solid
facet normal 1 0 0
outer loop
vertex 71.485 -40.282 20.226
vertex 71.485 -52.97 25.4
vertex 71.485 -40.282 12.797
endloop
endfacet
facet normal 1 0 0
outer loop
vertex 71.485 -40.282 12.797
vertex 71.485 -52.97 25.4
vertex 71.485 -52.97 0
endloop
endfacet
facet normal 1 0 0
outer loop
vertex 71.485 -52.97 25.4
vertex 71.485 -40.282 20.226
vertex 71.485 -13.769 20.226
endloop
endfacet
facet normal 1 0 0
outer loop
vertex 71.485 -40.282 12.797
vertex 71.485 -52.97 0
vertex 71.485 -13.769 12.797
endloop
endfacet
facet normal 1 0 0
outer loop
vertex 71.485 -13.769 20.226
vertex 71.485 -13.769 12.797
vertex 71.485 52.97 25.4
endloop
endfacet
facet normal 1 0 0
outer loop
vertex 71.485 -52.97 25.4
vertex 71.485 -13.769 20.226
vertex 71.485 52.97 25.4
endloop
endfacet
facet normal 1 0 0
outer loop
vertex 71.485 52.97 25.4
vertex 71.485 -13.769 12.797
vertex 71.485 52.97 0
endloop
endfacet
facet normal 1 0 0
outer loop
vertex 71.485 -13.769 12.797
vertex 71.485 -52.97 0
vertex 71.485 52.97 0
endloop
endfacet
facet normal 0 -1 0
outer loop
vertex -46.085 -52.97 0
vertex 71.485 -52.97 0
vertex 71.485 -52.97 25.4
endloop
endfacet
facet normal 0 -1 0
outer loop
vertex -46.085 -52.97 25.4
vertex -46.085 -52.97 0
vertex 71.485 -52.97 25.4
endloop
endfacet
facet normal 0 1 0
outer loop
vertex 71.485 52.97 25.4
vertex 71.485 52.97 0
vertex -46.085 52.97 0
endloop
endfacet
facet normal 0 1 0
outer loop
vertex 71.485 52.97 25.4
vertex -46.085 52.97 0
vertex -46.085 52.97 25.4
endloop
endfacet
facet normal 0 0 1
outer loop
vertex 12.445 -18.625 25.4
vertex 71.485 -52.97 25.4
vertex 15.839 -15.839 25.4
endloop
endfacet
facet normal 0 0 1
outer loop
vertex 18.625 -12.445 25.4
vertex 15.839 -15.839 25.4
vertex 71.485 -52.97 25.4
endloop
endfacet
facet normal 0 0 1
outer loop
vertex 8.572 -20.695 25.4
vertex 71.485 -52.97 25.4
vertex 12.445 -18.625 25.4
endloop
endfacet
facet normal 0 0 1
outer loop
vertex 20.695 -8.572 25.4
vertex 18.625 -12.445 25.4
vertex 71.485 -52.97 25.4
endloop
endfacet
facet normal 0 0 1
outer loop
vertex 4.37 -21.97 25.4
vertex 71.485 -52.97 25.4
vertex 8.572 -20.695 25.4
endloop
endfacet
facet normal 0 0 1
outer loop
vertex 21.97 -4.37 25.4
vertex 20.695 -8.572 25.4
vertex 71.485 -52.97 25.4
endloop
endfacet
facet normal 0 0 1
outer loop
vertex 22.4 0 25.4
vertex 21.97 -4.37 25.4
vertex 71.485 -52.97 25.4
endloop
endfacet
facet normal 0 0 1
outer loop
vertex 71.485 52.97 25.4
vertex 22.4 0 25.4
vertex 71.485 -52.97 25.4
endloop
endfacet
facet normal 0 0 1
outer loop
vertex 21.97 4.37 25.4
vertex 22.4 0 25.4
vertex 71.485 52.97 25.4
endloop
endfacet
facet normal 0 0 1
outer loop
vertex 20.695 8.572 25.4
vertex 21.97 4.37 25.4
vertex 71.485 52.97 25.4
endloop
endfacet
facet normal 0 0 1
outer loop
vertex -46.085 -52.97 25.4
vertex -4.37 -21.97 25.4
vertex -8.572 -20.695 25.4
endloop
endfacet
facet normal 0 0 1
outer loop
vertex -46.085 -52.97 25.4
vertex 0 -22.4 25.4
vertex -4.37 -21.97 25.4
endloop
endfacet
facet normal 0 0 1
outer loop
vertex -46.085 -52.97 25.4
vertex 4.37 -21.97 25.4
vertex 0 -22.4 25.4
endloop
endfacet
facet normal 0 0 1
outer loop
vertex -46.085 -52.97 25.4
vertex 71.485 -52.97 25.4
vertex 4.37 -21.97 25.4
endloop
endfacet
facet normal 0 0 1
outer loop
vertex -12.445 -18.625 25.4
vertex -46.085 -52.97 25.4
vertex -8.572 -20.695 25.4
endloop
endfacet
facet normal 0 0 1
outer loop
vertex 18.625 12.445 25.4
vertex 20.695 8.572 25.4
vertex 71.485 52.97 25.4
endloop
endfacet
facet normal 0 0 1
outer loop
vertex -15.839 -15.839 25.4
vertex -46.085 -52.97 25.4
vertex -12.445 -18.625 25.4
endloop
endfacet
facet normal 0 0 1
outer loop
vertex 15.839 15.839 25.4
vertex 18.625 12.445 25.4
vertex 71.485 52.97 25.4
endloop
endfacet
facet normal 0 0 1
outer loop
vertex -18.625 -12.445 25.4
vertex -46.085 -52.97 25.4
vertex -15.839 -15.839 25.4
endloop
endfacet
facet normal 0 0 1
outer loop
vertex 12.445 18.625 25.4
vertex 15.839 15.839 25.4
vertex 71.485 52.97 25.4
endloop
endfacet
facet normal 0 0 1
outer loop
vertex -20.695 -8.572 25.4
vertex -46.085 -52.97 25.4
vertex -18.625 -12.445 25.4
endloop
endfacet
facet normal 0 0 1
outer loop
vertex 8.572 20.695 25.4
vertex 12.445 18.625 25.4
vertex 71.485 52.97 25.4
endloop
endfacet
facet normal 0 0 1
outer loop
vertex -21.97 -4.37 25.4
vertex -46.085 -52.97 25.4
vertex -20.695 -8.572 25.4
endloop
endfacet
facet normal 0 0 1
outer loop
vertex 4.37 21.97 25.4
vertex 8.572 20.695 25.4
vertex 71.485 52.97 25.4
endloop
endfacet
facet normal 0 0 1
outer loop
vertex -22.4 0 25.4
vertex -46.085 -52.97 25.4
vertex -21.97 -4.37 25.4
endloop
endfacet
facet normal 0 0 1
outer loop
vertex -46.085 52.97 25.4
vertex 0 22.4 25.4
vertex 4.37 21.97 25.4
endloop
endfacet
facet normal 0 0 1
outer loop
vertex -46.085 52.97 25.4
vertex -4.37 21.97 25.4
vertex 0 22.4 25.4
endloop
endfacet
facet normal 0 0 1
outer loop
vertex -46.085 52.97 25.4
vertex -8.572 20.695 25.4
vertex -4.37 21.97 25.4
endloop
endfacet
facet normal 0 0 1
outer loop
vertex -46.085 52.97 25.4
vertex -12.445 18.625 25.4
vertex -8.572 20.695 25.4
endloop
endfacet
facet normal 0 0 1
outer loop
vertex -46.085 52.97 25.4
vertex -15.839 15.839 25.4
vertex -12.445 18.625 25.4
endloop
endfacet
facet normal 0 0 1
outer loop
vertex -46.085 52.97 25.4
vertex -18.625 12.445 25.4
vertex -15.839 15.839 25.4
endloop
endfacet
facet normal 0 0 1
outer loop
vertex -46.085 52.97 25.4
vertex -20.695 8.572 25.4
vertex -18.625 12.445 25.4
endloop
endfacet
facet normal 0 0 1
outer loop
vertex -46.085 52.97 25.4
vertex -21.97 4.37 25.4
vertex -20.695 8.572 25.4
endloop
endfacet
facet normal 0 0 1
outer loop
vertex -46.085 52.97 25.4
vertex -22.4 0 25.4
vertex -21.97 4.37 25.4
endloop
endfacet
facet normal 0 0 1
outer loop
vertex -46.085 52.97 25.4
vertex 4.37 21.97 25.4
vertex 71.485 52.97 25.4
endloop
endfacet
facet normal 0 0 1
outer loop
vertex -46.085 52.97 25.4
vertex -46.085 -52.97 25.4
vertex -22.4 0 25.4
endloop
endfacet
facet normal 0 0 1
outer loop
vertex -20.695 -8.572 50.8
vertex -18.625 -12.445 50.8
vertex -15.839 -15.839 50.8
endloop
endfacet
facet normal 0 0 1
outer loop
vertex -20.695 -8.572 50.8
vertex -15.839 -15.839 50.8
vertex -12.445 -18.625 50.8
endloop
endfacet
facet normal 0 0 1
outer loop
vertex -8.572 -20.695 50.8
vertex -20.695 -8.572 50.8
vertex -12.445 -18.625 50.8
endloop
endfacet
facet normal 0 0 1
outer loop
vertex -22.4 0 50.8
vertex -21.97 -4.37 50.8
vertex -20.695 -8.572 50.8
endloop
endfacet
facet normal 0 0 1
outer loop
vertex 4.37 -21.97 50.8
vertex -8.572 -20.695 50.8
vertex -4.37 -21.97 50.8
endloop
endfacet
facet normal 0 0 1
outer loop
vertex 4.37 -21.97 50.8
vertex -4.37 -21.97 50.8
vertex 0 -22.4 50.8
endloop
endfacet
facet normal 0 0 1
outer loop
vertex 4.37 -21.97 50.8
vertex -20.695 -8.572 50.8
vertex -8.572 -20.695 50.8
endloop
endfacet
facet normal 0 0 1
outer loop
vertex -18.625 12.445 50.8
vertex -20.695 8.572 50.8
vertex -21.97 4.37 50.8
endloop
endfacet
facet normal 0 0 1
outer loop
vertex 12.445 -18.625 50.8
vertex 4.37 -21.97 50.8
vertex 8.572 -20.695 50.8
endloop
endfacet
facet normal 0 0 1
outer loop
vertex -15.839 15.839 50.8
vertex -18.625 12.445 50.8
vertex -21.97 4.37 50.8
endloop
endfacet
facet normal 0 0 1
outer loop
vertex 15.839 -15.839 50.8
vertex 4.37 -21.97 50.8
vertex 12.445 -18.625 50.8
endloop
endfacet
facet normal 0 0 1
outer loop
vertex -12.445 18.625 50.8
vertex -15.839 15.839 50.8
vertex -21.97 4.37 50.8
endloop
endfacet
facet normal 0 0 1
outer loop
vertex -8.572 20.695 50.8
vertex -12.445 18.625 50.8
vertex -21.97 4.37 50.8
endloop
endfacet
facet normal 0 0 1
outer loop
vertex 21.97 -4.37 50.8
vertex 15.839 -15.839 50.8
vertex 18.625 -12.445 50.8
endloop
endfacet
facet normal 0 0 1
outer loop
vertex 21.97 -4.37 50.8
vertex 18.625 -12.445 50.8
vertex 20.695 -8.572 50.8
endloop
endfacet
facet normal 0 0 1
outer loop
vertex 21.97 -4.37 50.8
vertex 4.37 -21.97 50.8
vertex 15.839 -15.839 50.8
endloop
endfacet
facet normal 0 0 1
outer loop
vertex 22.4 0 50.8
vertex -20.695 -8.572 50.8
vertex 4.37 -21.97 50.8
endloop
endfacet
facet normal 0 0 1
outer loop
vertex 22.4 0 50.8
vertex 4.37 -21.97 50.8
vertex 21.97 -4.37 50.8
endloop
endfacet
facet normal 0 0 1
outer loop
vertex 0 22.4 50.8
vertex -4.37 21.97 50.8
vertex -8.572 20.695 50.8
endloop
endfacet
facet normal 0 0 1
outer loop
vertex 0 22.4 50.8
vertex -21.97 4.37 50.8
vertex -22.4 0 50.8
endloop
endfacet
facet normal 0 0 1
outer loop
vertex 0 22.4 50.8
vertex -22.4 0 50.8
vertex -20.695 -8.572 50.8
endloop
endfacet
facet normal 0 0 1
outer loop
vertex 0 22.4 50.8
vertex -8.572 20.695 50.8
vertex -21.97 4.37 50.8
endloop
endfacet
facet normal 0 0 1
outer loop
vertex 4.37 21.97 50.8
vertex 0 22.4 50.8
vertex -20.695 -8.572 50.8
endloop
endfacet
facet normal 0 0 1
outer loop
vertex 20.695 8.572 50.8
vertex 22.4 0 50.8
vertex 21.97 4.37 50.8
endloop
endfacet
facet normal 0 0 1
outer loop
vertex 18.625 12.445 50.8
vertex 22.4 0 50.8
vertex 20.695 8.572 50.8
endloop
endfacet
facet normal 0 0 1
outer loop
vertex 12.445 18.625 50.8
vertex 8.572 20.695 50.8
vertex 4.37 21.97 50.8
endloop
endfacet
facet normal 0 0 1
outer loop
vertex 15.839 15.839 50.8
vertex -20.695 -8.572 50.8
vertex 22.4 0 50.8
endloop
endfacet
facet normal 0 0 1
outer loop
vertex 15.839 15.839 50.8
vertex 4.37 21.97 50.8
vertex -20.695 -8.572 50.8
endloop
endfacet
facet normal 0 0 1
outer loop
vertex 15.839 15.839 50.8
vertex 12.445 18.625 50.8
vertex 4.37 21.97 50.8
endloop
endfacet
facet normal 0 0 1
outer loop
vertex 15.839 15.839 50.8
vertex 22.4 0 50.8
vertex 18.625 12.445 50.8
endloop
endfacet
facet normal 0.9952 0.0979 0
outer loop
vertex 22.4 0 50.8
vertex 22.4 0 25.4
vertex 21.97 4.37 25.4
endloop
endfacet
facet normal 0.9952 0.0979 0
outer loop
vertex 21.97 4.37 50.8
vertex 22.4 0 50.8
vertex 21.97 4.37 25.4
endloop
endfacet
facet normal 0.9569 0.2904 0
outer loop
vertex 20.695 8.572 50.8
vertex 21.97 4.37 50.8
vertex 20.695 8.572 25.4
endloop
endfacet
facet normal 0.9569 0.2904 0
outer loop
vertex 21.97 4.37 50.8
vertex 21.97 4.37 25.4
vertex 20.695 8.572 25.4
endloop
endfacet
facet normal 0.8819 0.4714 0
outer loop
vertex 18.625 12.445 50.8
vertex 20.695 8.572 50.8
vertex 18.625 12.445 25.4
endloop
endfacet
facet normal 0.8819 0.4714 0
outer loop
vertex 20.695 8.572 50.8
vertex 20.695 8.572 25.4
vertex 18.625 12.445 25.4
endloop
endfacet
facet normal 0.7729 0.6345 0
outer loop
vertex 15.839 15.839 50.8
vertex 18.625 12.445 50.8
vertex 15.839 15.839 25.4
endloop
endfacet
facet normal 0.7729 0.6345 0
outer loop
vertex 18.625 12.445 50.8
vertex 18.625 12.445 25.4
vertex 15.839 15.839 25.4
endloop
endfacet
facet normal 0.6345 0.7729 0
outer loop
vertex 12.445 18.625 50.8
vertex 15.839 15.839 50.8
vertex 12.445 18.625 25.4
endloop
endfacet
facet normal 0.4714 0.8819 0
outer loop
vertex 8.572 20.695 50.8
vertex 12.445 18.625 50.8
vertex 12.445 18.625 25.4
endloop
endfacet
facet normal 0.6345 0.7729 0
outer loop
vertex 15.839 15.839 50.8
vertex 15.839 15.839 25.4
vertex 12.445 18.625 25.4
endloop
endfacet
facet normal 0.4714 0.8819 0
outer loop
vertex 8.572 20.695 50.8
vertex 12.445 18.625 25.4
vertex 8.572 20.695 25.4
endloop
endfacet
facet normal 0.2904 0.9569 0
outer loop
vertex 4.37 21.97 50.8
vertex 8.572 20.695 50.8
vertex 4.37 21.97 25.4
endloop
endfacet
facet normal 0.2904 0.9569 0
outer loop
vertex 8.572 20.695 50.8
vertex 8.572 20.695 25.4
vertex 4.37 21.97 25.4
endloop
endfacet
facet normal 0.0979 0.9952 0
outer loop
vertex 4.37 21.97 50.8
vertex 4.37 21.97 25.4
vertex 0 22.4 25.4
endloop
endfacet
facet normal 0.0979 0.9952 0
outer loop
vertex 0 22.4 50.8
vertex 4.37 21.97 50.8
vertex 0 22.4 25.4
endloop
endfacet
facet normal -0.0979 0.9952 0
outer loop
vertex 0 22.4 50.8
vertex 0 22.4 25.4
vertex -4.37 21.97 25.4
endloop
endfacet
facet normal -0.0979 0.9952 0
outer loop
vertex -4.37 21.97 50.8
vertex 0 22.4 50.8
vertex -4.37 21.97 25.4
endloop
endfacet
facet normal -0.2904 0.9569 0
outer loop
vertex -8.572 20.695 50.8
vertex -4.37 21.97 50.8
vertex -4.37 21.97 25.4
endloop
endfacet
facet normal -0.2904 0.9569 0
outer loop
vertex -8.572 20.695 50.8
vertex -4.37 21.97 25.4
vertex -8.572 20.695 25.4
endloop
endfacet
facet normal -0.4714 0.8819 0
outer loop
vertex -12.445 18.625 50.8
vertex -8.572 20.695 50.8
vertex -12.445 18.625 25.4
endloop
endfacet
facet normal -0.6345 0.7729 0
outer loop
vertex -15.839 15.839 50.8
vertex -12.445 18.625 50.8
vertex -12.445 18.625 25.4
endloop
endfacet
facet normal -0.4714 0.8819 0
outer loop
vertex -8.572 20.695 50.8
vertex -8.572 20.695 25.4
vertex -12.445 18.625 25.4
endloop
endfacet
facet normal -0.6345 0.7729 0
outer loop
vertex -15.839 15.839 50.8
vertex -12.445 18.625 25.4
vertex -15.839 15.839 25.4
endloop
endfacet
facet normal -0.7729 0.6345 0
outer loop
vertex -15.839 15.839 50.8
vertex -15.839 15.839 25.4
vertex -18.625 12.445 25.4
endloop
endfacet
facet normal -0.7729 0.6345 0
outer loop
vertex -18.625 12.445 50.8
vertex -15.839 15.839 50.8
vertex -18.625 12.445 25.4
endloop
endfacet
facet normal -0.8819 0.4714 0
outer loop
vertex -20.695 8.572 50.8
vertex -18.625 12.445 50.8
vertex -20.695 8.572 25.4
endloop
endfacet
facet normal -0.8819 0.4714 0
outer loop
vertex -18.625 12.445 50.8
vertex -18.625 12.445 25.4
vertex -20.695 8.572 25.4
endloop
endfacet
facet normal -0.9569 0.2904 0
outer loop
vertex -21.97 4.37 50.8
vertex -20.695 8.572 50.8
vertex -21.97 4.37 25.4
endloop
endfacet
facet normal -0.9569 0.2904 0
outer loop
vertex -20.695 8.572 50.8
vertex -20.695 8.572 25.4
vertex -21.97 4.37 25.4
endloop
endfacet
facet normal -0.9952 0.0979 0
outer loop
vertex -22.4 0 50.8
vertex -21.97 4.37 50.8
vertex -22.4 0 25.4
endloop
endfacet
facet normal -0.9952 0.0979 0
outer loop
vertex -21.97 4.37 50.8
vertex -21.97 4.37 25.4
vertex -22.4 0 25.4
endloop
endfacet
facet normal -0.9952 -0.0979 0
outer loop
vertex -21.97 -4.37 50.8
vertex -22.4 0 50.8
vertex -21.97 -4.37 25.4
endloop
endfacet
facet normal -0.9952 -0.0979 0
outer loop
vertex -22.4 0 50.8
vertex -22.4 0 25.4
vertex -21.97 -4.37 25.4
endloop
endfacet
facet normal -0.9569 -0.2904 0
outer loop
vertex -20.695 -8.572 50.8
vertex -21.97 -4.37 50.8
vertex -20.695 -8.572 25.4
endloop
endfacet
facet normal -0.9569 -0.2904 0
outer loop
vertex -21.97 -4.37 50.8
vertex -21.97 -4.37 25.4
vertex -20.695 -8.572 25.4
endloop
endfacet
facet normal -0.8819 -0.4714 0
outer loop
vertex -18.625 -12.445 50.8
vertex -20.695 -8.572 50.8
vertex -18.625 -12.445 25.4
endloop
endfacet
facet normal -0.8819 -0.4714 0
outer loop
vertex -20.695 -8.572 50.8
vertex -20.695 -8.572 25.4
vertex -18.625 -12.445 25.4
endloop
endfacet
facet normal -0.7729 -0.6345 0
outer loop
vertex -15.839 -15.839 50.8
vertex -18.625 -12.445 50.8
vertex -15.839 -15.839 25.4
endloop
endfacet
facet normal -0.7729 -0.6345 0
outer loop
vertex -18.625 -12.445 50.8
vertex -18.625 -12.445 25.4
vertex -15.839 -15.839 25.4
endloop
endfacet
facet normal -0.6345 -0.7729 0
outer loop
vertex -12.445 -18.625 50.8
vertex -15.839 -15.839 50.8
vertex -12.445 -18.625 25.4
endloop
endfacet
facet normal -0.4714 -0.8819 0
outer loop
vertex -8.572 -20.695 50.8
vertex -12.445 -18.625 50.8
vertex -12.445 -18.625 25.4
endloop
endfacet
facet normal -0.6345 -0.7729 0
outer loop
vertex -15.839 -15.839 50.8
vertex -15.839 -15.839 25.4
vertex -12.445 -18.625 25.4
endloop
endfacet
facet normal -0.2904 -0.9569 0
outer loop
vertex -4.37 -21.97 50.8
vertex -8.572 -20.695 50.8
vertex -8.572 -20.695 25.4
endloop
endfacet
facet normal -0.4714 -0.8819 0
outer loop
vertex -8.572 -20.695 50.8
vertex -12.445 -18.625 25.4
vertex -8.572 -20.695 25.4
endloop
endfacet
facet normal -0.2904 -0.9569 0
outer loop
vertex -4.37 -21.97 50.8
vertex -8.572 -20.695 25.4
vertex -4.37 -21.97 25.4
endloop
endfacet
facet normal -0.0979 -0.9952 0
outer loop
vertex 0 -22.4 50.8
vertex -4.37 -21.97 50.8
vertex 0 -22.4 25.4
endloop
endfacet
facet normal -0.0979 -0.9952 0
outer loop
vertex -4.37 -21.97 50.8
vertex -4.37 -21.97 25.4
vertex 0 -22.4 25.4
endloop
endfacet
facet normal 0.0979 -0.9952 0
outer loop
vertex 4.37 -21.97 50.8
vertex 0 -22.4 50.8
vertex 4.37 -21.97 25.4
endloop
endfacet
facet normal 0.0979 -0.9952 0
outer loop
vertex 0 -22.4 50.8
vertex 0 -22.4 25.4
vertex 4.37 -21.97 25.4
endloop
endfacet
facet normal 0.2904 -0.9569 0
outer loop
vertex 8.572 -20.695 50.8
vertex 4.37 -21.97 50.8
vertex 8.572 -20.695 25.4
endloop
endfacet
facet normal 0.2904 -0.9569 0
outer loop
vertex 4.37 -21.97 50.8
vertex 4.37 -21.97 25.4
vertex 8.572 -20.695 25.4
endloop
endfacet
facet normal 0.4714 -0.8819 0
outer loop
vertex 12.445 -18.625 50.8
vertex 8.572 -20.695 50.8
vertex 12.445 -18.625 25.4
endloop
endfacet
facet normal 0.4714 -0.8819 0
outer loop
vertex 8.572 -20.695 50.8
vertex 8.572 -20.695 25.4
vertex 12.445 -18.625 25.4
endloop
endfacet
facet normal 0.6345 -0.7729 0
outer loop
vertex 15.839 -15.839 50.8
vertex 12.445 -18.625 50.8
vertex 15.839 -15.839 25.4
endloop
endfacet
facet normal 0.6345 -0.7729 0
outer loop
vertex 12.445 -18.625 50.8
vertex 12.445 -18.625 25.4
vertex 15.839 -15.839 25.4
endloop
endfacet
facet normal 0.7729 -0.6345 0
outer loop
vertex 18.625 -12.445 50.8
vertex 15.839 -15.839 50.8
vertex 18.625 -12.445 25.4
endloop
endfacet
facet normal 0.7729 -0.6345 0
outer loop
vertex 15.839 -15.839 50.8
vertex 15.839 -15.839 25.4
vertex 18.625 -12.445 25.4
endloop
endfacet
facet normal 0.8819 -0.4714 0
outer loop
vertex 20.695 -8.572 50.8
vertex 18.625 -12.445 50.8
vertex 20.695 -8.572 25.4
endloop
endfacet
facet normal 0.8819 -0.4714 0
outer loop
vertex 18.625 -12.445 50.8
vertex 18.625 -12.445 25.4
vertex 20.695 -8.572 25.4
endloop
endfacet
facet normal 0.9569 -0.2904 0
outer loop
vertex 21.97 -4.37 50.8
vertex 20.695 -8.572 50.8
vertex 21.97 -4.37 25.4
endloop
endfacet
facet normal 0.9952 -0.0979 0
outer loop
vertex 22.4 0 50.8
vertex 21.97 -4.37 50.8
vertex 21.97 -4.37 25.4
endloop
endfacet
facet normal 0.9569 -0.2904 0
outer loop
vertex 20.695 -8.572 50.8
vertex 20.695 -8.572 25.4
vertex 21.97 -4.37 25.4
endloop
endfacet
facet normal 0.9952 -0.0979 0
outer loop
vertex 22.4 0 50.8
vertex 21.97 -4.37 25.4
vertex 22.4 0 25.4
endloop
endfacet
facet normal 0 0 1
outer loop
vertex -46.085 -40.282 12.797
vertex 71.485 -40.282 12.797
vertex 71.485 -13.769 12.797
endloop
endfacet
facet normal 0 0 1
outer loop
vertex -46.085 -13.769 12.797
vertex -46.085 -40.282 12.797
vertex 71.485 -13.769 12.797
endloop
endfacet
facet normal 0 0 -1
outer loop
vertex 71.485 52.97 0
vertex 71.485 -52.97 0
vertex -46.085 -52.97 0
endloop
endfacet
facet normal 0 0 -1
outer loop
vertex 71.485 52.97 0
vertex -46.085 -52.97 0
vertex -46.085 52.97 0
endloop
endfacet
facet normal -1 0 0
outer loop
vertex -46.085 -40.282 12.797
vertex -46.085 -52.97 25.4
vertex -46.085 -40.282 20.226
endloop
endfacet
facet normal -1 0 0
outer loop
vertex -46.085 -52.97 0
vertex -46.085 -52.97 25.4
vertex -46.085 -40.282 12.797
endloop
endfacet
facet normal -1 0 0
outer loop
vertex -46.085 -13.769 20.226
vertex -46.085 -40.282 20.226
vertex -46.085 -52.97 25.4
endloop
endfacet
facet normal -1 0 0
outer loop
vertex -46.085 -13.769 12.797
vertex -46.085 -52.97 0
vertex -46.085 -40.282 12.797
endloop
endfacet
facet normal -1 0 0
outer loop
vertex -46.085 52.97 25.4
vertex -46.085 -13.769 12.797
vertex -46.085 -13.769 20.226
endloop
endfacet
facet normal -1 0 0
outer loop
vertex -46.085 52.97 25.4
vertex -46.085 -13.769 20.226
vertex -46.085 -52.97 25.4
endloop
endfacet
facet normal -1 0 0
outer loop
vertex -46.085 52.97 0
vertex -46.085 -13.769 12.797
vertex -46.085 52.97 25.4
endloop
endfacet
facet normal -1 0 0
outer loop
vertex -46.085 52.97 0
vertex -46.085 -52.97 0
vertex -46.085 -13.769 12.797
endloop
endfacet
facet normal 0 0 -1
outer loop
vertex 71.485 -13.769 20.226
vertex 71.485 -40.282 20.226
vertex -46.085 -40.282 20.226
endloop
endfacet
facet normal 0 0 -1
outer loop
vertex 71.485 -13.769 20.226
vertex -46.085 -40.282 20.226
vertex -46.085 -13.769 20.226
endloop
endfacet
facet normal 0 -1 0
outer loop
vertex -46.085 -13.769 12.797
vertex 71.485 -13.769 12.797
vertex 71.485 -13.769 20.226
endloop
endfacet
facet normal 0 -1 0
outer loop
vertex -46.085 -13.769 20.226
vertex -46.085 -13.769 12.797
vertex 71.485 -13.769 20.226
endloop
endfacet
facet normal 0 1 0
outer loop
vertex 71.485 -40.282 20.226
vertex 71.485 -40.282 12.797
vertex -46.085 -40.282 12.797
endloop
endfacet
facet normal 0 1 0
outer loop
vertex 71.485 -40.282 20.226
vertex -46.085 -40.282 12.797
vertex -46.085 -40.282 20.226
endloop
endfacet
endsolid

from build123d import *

# Parameters (mm, degrees)
F0_W     = 92.1698585153
F0_H     = 105.9397310019
F1_DEPTH = 25.4
F2_R     = 22.4003702497
F3_DEPTH = 25.4
F4_DEPTH = 25.4
F5_W     = 26.5126917511
F5_H     = 7.429022342
F6_DEPTH = 117.5708585153


with BuildPart() as f1:
    # F0 (on Top) → F1 (new body)
    with BuildSketch(Plane.XY):
        Rectangle(F0_W, F0_H)
    extrude(amount=F1_DEPTH)

    # F2 (on face) → F3 (join)
    with BuildSketch(Plane.XY.offset(25.4)):
        Circle(F2_R)
    extrude(amount=F3_DEPTH)

    # F4 (add): a face of the model
    f4_faces = [f1.faces().sort_by_distance(p)[0] for p in [
        (46.0849292576, 0, 12.7),
    ]]
    extrude(f4_faces, amount=F4_DEPTH)

    # F5 (on face) → F6 (cut, through all)
    with BuildSketch(Plane.YZ.offset(71.4849292576)):
        with Locations((-27.0254462957, 16.5118221194)):
            Rectangle(F5_W, F5_H)
    extrude(amount=-F6_DEPTH, mode=Mode.SUBTRACT)


solid = f1.part
